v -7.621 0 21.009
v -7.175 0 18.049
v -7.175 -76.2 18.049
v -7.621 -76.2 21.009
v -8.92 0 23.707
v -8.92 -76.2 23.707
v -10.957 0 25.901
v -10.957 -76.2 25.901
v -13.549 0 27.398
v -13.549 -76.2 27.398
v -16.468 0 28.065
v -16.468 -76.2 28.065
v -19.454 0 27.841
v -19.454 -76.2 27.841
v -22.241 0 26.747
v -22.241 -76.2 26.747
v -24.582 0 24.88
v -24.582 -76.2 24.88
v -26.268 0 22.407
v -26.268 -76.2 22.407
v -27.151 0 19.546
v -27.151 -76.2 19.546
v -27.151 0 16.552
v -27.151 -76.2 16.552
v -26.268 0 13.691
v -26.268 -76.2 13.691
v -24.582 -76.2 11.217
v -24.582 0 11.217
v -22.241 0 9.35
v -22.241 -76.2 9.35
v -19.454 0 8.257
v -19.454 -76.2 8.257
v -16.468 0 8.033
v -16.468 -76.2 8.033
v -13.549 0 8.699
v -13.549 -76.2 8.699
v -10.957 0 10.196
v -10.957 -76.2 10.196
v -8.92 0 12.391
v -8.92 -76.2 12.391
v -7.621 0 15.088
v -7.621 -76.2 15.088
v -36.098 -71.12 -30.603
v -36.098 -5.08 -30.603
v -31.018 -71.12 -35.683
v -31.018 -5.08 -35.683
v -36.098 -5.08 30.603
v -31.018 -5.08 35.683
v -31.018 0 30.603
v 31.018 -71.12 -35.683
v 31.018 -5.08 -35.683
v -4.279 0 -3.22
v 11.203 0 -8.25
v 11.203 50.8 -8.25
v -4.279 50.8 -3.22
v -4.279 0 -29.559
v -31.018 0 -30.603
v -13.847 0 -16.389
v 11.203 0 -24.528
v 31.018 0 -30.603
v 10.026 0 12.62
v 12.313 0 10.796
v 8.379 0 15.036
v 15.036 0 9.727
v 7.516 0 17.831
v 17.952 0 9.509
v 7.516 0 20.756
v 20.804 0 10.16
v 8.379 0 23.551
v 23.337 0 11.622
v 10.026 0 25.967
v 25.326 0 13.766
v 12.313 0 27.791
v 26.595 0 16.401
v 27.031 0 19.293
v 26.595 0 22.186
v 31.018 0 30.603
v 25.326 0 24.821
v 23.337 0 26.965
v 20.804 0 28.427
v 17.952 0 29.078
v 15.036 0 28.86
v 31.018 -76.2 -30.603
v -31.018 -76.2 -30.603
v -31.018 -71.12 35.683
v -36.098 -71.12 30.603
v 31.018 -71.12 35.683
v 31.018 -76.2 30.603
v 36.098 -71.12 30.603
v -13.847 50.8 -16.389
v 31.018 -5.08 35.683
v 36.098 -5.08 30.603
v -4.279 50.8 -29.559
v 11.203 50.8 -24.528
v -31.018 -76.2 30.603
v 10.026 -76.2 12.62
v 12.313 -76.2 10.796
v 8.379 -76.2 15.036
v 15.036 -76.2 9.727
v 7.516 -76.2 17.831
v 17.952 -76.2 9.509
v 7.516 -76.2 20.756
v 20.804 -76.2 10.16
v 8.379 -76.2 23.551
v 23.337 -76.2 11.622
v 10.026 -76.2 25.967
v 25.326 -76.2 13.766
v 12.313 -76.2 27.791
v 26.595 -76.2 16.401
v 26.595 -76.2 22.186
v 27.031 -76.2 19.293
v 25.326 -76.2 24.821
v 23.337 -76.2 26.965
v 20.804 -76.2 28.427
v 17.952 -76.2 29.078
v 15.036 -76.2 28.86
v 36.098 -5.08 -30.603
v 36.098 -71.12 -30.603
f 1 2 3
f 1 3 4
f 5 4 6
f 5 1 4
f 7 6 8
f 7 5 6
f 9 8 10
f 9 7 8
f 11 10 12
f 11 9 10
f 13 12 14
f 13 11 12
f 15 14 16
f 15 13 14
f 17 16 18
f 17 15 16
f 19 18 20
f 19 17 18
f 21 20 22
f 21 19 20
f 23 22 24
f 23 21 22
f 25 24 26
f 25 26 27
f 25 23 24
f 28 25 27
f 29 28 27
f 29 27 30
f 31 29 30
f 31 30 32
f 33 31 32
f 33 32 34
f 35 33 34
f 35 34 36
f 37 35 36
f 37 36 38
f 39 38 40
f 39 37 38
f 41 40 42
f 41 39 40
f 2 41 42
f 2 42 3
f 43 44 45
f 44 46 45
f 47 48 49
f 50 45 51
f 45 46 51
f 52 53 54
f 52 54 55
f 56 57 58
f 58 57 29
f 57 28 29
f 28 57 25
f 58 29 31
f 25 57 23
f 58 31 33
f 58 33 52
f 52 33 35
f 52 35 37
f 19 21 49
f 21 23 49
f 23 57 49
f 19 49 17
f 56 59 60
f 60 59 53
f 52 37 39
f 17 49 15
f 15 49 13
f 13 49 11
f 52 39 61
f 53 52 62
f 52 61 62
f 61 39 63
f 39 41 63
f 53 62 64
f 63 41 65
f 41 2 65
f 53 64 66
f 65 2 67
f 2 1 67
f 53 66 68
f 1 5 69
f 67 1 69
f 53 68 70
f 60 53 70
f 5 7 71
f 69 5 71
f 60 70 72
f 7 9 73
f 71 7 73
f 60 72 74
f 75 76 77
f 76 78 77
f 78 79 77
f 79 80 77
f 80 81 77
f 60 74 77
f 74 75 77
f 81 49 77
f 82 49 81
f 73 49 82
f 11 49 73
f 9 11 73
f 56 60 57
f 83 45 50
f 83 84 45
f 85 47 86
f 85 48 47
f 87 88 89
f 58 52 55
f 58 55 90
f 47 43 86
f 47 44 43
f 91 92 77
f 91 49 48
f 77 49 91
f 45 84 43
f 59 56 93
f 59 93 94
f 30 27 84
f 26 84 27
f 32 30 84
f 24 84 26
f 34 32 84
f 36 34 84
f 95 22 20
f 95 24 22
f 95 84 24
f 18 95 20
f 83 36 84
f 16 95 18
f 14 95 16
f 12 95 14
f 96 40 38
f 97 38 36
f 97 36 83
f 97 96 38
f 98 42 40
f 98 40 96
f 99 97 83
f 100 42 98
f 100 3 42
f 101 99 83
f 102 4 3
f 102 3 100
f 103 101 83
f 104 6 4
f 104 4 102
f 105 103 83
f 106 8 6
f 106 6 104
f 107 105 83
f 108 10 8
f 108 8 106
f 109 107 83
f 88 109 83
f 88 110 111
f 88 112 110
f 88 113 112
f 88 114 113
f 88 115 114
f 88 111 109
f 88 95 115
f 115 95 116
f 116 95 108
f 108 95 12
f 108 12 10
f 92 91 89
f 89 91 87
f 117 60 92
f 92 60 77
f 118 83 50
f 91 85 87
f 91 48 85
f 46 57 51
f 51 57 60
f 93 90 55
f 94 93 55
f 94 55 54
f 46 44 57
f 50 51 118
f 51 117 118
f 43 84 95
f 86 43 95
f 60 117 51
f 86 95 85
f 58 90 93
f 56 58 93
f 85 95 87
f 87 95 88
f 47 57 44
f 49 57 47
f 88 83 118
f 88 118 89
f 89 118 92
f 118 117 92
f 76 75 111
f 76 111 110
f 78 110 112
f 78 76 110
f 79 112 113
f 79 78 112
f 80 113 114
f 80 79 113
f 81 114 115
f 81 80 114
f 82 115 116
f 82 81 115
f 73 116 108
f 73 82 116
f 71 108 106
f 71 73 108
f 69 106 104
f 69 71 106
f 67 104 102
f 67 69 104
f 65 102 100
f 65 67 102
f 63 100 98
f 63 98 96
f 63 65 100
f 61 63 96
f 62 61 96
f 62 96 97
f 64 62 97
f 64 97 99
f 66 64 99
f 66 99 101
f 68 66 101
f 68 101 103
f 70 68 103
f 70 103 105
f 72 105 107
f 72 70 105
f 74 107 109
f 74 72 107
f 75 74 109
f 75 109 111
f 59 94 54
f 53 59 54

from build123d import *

# Parameters (mm, degrees)
F0_W     = 72.195024
F0_H     = 71.365238
F1_DEPTH = 76.2
F2_SIZE  = 5.08
F3_R     = 10.044016
F3_R_2   = 9.812081
F4_DEPTH = 76.2
F6_DEPTH = 50.8


with BuildPart() as f1:
    # F0 (on Front) → F1 (new body)
    with BuildSketch(Plane.XZ):
        Rectangle(F0_W, F0_H)
    extrude(amount=F1_DEPTH)

    # F2
    f2_edges = [f1.edges().sort_by_distance(p)[0] for p in [
        (0, -76.2, -35.682619),
        (36.097512, -76.2, 0),
        (0, -76.2, 35.682619),
        (-36.097512, -76.2, 0),
        (36.097512, -38.1, -35.682619),
        (36.097512, -38.1, 35.682619),
        (36.097512, 0, 0),
        (-36.097512, -38.1, 35.682619),
        (0, 0, 35.682619),
        (-36.097512, -38.1, -35.682619),
        (-36.097512, 0, 0),
        (0, 0, -35.682619),
    ]]
    chamfer(f2_edges, length=F2_SIZE)

    # F3 (on Front) → F4 (cut)
    with BuildSketch(Plane.XZ):
        with Locations((-17.218977, 18.048741)):
            Circle(F3_R)
        with Locations((17.218918, 19.29348)):
            Circle(F3_R_2)
    extrude(amount=F4_DEPTH, mode=Mode.SUBTRACT)

    # F5 (on Front) → F6 (join)
    with BuildSketch(Plane.XZ):
        Polygon((11.202648, -24.528347), (11.202648, -8.249946), (-4.279031, -3.219644), (-13.847235, -16.389146), (-4.279031, -29.558649), align=None)
    extrude(amount=-F6_DEPTH)


solid = f1.part
